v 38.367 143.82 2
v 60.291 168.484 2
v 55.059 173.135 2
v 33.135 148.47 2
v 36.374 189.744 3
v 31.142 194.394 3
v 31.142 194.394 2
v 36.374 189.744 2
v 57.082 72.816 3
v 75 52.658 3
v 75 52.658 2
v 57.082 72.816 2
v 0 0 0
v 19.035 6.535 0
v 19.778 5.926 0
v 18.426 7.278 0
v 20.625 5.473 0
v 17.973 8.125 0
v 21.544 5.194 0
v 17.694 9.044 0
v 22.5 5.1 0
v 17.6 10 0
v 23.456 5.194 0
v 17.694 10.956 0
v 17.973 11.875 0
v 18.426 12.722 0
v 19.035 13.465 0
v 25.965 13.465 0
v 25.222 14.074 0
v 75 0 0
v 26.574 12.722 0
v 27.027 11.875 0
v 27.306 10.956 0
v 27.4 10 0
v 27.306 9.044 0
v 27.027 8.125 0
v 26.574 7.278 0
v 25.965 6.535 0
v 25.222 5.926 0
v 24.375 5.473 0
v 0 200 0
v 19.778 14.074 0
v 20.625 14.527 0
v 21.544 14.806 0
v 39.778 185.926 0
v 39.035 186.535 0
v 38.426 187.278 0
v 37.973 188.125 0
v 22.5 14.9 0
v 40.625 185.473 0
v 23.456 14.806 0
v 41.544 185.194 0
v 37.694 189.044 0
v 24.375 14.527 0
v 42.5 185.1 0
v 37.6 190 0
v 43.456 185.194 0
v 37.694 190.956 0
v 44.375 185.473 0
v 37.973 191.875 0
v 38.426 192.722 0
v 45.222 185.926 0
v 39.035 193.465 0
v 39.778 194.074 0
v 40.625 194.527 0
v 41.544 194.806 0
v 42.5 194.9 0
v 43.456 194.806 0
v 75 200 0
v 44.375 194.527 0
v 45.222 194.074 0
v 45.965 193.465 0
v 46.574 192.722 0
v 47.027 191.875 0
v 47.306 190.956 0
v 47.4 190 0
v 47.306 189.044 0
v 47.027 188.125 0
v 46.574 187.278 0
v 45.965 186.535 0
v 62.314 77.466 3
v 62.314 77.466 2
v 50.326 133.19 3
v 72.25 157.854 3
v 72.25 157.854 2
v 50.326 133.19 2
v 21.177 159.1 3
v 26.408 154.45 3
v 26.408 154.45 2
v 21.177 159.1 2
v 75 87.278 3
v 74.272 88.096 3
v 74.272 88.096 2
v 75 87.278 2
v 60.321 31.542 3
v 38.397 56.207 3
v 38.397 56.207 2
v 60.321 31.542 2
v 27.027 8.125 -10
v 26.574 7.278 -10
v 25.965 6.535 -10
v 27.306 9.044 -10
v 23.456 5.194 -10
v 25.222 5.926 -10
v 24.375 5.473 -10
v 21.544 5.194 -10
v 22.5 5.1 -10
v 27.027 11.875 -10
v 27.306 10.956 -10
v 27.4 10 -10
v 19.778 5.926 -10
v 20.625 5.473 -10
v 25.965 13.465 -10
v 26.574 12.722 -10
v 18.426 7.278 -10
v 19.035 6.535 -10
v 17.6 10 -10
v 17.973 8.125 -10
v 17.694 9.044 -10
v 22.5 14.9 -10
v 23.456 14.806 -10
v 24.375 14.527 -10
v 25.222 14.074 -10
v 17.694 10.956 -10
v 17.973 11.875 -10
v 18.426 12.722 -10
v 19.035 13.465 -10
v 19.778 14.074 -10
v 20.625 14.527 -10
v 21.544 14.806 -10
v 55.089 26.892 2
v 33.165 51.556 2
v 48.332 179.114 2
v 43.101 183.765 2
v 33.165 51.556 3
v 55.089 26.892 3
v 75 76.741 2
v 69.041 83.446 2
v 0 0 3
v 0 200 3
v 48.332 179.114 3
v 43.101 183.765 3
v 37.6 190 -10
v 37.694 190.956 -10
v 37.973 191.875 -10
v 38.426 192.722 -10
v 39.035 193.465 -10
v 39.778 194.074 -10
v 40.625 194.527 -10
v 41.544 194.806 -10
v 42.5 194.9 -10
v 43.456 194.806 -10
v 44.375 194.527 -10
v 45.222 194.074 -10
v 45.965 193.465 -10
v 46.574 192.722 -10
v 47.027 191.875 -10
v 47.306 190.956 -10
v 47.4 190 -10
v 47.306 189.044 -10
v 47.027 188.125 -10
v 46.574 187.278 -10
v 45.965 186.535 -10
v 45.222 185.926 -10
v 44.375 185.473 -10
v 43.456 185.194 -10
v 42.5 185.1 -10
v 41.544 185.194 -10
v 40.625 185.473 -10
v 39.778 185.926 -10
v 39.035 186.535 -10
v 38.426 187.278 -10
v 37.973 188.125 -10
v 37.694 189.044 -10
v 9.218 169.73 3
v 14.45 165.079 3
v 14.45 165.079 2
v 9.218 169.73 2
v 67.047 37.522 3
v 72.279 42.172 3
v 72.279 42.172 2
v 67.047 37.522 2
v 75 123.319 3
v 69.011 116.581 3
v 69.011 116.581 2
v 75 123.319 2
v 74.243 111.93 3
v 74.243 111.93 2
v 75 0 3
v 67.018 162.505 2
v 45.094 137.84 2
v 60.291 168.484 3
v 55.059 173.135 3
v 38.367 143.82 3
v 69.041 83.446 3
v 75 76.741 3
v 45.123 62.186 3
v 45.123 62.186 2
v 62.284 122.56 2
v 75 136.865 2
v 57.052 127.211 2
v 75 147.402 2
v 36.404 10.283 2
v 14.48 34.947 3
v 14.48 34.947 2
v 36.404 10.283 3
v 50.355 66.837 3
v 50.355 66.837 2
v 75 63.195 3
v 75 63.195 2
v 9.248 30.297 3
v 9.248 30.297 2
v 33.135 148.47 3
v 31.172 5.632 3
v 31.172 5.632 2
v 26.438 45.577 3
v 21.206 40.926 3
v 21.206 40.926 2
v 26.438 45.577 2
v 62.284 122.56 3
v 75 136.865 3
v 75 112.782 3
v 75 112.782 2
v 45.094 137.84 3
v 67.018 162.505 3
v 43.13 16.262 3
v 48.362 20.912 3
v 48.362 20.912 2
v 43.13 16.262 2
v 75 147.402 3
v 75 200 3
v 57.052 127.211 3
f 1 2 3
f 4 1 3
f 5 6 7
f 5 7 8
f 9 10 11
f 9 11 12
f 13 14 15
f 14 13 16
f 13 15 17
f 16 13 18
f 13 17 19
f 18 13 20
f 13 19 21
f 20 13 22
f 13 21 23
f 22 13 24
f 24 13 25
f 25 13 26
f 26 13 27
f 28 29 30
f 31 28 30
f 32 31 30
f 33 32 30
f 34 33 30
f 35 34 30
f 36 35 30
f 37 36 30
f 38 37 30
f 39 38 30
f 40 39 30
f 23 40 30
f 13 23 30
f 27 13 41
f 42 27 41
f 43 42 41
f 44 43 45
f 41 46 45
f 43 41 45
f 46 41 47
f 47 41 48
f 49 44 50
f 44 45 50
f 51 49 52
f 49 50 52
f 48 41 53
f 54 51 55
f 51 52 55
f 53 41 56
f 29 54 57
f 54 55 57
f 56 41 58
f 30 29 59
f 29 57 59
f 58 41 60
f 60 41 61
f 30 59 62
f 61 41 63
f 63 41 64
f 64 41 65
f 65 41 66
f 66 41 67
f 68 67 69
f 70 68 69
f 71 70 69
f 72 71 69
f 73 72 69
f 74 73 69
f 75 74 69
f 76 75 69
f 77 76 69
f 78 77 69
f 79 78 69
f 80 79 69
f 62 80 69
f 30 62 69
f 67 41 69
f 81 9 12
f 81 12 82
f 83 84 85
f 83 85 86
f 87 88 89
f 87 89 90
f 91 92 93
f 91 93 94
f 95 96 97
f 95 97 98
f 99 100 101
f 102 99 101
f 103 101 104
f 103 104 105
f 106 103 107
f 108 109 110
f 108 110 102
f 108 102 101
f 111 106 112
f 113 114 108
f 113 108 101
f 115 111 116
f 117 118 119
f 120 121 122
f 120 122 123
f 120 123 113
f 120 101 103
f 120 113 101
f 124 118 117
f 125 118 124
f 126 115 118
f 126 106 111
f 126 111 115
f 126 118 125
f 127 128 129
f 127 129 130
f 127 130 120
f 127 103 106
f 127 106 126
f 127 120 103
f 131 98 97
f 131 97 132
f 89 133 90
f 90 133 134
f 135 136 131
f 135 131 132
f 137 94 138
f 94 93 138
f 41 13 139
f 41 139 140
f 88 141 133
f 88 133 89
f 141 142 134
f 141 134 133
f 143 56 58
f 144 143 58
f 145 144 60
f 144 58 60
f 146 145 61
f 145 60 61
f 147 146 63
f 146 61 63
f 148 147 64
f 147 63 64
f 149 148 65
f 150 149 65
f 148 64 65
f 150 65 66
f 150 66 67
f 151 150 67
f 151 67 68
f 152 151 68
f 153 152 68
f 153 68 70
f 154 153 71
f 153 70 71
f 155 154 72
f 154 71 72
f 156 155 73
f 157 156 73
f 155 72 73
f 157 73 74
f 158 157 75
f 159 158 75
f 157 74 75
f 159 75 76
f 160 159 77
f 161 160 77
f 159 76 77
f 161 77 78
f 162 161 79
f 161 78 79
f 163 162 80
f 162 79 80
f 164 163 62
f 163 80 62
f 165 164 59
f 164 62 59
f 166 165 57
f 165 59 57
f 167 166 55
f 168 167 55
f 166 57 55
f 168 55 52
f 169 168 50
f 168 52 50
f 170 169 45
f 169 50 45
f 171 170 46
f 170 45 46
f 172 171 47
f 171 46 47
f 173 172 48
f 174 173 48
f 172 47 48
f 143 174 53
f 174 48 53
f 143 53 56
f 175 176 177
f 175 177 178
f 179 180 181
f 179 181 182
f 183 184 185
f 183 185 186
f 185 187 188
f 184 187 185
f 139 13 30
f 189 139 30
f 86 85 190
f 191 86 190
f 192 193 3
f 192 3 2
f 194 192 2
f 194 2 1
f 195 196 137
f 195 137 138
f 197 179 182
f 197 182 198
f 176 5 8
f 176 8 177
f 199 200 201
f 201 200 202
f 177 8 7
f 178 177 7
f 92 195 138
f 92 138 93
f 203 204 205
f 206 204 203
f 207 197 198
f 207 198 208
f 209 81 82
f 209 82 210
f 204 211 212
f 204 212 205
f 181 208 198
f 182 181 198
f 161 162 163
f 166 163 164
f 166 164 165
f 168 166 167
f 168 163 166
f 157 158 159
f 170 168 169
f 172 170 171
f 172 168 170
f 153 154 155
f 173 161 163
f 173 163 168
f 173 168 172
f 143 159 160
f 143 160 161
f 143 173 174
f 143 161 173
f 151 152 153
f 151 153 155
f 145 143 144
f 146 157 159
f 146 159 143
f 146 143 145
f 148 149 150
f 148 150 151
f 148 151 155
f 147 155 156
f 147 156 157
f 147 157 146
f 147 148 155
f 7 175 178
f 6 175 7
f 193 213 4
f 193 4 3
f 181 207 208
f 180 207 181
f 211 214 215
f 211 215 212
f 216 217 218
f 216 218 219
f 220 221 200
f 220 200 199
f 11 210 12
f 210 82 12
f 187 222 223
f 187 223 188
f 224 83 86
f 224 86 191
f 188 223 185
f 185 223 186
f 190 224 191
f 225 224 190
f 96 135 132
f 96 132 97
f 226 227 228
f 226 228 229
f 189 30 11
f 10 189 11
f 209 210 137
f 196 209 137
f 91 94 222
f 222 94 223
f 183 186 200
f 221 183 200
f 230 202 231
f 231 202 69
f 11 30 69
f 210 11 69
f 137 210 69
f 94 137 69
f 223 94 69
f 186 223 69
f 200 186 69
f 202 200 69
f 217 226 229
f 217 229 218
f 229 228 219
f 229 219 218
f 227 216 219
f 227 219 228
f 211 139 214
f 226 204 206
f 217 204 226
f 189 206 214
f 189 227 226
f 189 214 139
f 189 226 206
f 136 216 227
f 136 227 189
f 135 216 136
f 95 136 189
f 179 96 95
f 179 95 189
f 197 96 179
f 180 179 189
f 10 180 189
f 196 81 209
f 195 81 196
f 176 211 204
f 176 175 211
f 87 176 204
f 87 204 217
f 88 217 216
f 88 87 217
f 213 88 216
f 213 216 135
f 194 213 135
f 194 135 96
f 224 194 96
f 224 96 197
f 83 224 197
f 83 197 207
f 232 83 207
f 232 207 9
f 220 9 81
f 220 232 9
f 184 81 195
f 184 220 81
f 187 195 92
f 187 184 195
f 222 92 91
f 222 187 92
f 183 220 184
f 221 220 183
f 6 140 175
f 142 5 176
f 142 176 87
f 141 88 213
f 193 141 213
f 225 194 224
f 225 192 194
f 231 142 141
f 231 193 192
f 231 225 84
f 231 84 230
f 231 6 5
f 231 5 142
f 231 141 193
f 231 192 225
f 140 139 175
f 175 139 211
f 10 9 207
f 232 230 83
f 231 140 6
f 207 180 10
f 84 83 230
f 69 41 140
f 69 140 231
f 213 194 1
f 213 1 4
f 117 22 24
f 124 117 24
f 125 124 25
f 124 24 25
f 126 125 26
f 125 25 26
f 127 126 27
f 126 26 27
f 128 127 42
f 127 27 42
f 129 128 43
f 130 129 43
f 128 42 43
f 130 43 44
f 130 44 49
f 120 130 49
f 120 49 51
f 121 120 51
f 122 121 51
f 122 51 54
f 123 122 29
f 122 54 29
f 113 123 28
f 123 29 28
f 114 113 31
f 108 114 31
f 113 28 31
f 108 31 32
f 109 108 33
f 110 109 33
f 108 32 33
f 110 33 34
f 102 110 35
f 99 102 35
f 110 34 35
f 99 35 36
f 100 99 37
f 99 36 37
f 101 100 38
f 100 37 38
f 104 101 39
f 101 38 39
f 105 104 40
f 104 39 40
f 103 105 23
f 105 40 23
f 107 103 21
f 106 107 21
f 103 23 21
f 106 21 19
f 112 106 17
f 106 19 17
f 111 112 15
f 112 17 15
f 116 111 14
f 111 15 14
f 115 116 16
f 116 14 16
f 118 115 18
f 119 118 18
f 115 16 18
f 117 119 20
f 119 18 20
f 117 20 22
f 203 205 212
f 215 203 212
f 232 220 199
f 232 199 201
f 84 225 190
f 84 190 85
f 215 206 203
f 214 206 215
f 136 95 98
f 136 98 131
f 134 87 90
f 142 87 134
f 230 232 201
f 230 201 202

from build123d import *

# Parameters (mm, degrees)
SKETCH1_W           = 225
SKETCH1_H           = 200
BOSS_EXTRUDE1_DEPTH = 3
CUT_EXTRUDE1_DEPTH  = 1
SKETCH4_R           = 4.9
BOSS_EXTRUDE2_DEPTH = 10
SKETCH5_W           = 150
SKETCH5_H           = 200
CUT_EXTRUDE2_DEPTH  = 10


with BuildPart() as part:
    # Sketch1 → Boss-Extrude1 (new body)
    with BuildSketch(Plane.XY):
        with Locations((112.5, 100)):
            Rectangle(SKETCH1_W, SKETCH1_H)
    extrude(amount=BOSS_EXTRUDE1_DEPTH)

    # Sketch2 → Cut-Extrude1 (cut)
    with BuildSketch(Plane.XY.offset(3)):
        Polygon((21.176597363, 159.100101172), (43.100604044, 183.764608689), (48.332469275, 179.114061817), (26.408462593, 154.4495543), align=None)
        Polygon((9.218048264, 169.729922593), (31.142054945, 194.39443011), (36.373920176, 189.743883238), (14.449913495, 165.079375722), align=None)
        Polygon((33.135146462, 148.470279751), (55.059153143, 173.134787267), (60.291018374, 168.484240396), (38.367011692, 143.819732879), align=None)
        Polygon((45.093695561, 137.840458329), (67.017702242, 162.504965846), (72.249567473, 157.854418974), (50.325560791, 133.189911458), align=None)
        Polygon((57.05224466, 127.210636908), (78.976251341, 151.875144425), (84.208116572, 147.224597553), (62.28410989, 122.560090036), align=None)
        Polygon((69.010793758, 116.580815487), (90.93480044, 141.245323003), (96.166665671, 136.594776132), (74.242658989, 111.930268615), align=None)
        Polygon((80.969342857, 105.950994066), (102.893349539, 130.615501582), (108.12521477, 125.96495471), (86.201208088, 101.300447194), align=None)
        Polygon((116.844990154, 74.061529802), (138.768996836, 98.726037318), (144.000862066, 94.075490447), (122.076855385, 69.41098293), align=None)
        Polygon((128.803539253, 63.431708381), (150.727545935, 88.096215897), (155.959411165, 83.445669025), (134.035404484, 58.781161509), align=None)
        Polygon((140.762088352, 52.801886959), (162.686095033, 77.466394476), (167.917960264, 72.815847604), (145.993953583, 48.151340087), align=None)
        Polygon((152.720637451, 42.172065538), (174.644644132, 66.836573055), (179.876509363, 62.186026183), (157.952502682, 37.521518666), align=None)
        Polygon((164.67918655, 31.542244117), (186.603193231, 56.206751633), (191.835058462, 51.556204761), (169.911051781, 26.891697245), align=None)
        Polygon((176.637735649, 20.912422695), (198.56174233, 45.576930212), (203.793607561, 40.92638334), (181.86960088, 16.261875824), align=None)
        Polygon((188.596284748, 10.282601274), (210.520291429, 34.947108791), (215.75215666, 30.296561919), (193.828149979, 5.632054402), align=None)
        Polygon((198.591537407, 154.4495543), (176.667530725, 179.114061817), (181.899395956, 183.764608689), (203.823402637, 159.100101172), align=None)
        Polygon((210.550086505, 165.079375721), (188.626079824, 189.743883238), (193.857945055, 194.39443011), (215.781951736, 169.729922593), align=None)
        Polygon((186.632988308, 143.819732879), (164.708981626, 168.484240395), (169.940846857, 173.134787267), (191.864853538, 148.470279751), align=None)
        Polygon((174.674439209, 133.189911458), (152.750432527, 157.854418974), (157.982297758, 162.504965846), (179.906304439, 137.840458329), align=None)
        Polygon((162.71589011, 122.560090036), (140.791883428, 147.224597553), (146.023748659, 151.875144425), (167.94775534, 127.210636908), align=None)
        Polygon((150.757341011, 111.930268615), (128.833334329, 136.594776132), (134.06519956, 141.245323003), (155.989206242, 116.580815487), align=None)
        Polygon((138.798791912, 101.300447194), (116.87478523, 125.96495471), (122.106650461, 130.615501582), (144.030657143, 105.950994066), align=None)
        Polygon((102.923144615, 69.41098293), (80.999137934, 94.075490447), (86.231003164, 98.726037318), (108.155009846, 74.061529802), align=None)
        Polygon((90.964595516, 58.781161509), (69.040588835, 83.445669025), (74.272454065, 88.096215897), (96.196460747, 63.431708381), align=None)
        Polygon((79.006046417, 48.151340087), (57.082039736, 72.815847604), (62.313904967, 77.466394476), (84.237911648, 52.801886959), align=None)
        Polygon((67.047497318, 37.521518666), (45.123490637, 62.186026183), (50.355355868, 66.836573055), (72.279362549, 42.172065538), align=None)
        Polygon((55.088948219, 26.891697245), (33.164941538, 51.556204761), (38.396806769, 56.206751633), (60.32081345, 31.542244117), align=None)
        Polygon((43.13039912, 16.261875824), (21.206392439, 40.92638334), (26.43825767, 45.576930212), (48.362264351, 20.912422695), align=None)
        Polygon((31.171850021, 5.632054402), (9.24784334, 30.296561919), (14.479708571, 34.947108791), (36.403715252, 10.282601274), align=None)
    extrude(amount=-CUT_EXTRUDE1_DEPTH, mode=Mode.SUBTRACT)

    # Sketch4 → Boss-Extrude2 (add)
    with BuildSketch(Plane(origin=(0, 0, 0), x_dir=(-1, 0, 0), z_dir=(0, 0, -1))):
        with Locations((-42.5, 190)):
            Circle(SKETCH4_R)
        with Locations((-22.5, 10)):
            Circle(SKETCH4_R)
    extrude(amount=BOSS_EXTRUDE2_DEPTH)

    # Sketch5 → Cut-Extrude2 (cut)
    with BuildSketch(Plane(origin=(0, 0, 0), x_dir=(-1, 0, 0), z_dir=(0, 0, -1))):
        with Locations((-150, 100)):
            Rectangle(SKETCH5_W, SKETCH5_H)
    extrude(amount=-CUT_EXTRUDE2_DEPTH, mode=Mode.SUBTRACT)


solid = part.part
